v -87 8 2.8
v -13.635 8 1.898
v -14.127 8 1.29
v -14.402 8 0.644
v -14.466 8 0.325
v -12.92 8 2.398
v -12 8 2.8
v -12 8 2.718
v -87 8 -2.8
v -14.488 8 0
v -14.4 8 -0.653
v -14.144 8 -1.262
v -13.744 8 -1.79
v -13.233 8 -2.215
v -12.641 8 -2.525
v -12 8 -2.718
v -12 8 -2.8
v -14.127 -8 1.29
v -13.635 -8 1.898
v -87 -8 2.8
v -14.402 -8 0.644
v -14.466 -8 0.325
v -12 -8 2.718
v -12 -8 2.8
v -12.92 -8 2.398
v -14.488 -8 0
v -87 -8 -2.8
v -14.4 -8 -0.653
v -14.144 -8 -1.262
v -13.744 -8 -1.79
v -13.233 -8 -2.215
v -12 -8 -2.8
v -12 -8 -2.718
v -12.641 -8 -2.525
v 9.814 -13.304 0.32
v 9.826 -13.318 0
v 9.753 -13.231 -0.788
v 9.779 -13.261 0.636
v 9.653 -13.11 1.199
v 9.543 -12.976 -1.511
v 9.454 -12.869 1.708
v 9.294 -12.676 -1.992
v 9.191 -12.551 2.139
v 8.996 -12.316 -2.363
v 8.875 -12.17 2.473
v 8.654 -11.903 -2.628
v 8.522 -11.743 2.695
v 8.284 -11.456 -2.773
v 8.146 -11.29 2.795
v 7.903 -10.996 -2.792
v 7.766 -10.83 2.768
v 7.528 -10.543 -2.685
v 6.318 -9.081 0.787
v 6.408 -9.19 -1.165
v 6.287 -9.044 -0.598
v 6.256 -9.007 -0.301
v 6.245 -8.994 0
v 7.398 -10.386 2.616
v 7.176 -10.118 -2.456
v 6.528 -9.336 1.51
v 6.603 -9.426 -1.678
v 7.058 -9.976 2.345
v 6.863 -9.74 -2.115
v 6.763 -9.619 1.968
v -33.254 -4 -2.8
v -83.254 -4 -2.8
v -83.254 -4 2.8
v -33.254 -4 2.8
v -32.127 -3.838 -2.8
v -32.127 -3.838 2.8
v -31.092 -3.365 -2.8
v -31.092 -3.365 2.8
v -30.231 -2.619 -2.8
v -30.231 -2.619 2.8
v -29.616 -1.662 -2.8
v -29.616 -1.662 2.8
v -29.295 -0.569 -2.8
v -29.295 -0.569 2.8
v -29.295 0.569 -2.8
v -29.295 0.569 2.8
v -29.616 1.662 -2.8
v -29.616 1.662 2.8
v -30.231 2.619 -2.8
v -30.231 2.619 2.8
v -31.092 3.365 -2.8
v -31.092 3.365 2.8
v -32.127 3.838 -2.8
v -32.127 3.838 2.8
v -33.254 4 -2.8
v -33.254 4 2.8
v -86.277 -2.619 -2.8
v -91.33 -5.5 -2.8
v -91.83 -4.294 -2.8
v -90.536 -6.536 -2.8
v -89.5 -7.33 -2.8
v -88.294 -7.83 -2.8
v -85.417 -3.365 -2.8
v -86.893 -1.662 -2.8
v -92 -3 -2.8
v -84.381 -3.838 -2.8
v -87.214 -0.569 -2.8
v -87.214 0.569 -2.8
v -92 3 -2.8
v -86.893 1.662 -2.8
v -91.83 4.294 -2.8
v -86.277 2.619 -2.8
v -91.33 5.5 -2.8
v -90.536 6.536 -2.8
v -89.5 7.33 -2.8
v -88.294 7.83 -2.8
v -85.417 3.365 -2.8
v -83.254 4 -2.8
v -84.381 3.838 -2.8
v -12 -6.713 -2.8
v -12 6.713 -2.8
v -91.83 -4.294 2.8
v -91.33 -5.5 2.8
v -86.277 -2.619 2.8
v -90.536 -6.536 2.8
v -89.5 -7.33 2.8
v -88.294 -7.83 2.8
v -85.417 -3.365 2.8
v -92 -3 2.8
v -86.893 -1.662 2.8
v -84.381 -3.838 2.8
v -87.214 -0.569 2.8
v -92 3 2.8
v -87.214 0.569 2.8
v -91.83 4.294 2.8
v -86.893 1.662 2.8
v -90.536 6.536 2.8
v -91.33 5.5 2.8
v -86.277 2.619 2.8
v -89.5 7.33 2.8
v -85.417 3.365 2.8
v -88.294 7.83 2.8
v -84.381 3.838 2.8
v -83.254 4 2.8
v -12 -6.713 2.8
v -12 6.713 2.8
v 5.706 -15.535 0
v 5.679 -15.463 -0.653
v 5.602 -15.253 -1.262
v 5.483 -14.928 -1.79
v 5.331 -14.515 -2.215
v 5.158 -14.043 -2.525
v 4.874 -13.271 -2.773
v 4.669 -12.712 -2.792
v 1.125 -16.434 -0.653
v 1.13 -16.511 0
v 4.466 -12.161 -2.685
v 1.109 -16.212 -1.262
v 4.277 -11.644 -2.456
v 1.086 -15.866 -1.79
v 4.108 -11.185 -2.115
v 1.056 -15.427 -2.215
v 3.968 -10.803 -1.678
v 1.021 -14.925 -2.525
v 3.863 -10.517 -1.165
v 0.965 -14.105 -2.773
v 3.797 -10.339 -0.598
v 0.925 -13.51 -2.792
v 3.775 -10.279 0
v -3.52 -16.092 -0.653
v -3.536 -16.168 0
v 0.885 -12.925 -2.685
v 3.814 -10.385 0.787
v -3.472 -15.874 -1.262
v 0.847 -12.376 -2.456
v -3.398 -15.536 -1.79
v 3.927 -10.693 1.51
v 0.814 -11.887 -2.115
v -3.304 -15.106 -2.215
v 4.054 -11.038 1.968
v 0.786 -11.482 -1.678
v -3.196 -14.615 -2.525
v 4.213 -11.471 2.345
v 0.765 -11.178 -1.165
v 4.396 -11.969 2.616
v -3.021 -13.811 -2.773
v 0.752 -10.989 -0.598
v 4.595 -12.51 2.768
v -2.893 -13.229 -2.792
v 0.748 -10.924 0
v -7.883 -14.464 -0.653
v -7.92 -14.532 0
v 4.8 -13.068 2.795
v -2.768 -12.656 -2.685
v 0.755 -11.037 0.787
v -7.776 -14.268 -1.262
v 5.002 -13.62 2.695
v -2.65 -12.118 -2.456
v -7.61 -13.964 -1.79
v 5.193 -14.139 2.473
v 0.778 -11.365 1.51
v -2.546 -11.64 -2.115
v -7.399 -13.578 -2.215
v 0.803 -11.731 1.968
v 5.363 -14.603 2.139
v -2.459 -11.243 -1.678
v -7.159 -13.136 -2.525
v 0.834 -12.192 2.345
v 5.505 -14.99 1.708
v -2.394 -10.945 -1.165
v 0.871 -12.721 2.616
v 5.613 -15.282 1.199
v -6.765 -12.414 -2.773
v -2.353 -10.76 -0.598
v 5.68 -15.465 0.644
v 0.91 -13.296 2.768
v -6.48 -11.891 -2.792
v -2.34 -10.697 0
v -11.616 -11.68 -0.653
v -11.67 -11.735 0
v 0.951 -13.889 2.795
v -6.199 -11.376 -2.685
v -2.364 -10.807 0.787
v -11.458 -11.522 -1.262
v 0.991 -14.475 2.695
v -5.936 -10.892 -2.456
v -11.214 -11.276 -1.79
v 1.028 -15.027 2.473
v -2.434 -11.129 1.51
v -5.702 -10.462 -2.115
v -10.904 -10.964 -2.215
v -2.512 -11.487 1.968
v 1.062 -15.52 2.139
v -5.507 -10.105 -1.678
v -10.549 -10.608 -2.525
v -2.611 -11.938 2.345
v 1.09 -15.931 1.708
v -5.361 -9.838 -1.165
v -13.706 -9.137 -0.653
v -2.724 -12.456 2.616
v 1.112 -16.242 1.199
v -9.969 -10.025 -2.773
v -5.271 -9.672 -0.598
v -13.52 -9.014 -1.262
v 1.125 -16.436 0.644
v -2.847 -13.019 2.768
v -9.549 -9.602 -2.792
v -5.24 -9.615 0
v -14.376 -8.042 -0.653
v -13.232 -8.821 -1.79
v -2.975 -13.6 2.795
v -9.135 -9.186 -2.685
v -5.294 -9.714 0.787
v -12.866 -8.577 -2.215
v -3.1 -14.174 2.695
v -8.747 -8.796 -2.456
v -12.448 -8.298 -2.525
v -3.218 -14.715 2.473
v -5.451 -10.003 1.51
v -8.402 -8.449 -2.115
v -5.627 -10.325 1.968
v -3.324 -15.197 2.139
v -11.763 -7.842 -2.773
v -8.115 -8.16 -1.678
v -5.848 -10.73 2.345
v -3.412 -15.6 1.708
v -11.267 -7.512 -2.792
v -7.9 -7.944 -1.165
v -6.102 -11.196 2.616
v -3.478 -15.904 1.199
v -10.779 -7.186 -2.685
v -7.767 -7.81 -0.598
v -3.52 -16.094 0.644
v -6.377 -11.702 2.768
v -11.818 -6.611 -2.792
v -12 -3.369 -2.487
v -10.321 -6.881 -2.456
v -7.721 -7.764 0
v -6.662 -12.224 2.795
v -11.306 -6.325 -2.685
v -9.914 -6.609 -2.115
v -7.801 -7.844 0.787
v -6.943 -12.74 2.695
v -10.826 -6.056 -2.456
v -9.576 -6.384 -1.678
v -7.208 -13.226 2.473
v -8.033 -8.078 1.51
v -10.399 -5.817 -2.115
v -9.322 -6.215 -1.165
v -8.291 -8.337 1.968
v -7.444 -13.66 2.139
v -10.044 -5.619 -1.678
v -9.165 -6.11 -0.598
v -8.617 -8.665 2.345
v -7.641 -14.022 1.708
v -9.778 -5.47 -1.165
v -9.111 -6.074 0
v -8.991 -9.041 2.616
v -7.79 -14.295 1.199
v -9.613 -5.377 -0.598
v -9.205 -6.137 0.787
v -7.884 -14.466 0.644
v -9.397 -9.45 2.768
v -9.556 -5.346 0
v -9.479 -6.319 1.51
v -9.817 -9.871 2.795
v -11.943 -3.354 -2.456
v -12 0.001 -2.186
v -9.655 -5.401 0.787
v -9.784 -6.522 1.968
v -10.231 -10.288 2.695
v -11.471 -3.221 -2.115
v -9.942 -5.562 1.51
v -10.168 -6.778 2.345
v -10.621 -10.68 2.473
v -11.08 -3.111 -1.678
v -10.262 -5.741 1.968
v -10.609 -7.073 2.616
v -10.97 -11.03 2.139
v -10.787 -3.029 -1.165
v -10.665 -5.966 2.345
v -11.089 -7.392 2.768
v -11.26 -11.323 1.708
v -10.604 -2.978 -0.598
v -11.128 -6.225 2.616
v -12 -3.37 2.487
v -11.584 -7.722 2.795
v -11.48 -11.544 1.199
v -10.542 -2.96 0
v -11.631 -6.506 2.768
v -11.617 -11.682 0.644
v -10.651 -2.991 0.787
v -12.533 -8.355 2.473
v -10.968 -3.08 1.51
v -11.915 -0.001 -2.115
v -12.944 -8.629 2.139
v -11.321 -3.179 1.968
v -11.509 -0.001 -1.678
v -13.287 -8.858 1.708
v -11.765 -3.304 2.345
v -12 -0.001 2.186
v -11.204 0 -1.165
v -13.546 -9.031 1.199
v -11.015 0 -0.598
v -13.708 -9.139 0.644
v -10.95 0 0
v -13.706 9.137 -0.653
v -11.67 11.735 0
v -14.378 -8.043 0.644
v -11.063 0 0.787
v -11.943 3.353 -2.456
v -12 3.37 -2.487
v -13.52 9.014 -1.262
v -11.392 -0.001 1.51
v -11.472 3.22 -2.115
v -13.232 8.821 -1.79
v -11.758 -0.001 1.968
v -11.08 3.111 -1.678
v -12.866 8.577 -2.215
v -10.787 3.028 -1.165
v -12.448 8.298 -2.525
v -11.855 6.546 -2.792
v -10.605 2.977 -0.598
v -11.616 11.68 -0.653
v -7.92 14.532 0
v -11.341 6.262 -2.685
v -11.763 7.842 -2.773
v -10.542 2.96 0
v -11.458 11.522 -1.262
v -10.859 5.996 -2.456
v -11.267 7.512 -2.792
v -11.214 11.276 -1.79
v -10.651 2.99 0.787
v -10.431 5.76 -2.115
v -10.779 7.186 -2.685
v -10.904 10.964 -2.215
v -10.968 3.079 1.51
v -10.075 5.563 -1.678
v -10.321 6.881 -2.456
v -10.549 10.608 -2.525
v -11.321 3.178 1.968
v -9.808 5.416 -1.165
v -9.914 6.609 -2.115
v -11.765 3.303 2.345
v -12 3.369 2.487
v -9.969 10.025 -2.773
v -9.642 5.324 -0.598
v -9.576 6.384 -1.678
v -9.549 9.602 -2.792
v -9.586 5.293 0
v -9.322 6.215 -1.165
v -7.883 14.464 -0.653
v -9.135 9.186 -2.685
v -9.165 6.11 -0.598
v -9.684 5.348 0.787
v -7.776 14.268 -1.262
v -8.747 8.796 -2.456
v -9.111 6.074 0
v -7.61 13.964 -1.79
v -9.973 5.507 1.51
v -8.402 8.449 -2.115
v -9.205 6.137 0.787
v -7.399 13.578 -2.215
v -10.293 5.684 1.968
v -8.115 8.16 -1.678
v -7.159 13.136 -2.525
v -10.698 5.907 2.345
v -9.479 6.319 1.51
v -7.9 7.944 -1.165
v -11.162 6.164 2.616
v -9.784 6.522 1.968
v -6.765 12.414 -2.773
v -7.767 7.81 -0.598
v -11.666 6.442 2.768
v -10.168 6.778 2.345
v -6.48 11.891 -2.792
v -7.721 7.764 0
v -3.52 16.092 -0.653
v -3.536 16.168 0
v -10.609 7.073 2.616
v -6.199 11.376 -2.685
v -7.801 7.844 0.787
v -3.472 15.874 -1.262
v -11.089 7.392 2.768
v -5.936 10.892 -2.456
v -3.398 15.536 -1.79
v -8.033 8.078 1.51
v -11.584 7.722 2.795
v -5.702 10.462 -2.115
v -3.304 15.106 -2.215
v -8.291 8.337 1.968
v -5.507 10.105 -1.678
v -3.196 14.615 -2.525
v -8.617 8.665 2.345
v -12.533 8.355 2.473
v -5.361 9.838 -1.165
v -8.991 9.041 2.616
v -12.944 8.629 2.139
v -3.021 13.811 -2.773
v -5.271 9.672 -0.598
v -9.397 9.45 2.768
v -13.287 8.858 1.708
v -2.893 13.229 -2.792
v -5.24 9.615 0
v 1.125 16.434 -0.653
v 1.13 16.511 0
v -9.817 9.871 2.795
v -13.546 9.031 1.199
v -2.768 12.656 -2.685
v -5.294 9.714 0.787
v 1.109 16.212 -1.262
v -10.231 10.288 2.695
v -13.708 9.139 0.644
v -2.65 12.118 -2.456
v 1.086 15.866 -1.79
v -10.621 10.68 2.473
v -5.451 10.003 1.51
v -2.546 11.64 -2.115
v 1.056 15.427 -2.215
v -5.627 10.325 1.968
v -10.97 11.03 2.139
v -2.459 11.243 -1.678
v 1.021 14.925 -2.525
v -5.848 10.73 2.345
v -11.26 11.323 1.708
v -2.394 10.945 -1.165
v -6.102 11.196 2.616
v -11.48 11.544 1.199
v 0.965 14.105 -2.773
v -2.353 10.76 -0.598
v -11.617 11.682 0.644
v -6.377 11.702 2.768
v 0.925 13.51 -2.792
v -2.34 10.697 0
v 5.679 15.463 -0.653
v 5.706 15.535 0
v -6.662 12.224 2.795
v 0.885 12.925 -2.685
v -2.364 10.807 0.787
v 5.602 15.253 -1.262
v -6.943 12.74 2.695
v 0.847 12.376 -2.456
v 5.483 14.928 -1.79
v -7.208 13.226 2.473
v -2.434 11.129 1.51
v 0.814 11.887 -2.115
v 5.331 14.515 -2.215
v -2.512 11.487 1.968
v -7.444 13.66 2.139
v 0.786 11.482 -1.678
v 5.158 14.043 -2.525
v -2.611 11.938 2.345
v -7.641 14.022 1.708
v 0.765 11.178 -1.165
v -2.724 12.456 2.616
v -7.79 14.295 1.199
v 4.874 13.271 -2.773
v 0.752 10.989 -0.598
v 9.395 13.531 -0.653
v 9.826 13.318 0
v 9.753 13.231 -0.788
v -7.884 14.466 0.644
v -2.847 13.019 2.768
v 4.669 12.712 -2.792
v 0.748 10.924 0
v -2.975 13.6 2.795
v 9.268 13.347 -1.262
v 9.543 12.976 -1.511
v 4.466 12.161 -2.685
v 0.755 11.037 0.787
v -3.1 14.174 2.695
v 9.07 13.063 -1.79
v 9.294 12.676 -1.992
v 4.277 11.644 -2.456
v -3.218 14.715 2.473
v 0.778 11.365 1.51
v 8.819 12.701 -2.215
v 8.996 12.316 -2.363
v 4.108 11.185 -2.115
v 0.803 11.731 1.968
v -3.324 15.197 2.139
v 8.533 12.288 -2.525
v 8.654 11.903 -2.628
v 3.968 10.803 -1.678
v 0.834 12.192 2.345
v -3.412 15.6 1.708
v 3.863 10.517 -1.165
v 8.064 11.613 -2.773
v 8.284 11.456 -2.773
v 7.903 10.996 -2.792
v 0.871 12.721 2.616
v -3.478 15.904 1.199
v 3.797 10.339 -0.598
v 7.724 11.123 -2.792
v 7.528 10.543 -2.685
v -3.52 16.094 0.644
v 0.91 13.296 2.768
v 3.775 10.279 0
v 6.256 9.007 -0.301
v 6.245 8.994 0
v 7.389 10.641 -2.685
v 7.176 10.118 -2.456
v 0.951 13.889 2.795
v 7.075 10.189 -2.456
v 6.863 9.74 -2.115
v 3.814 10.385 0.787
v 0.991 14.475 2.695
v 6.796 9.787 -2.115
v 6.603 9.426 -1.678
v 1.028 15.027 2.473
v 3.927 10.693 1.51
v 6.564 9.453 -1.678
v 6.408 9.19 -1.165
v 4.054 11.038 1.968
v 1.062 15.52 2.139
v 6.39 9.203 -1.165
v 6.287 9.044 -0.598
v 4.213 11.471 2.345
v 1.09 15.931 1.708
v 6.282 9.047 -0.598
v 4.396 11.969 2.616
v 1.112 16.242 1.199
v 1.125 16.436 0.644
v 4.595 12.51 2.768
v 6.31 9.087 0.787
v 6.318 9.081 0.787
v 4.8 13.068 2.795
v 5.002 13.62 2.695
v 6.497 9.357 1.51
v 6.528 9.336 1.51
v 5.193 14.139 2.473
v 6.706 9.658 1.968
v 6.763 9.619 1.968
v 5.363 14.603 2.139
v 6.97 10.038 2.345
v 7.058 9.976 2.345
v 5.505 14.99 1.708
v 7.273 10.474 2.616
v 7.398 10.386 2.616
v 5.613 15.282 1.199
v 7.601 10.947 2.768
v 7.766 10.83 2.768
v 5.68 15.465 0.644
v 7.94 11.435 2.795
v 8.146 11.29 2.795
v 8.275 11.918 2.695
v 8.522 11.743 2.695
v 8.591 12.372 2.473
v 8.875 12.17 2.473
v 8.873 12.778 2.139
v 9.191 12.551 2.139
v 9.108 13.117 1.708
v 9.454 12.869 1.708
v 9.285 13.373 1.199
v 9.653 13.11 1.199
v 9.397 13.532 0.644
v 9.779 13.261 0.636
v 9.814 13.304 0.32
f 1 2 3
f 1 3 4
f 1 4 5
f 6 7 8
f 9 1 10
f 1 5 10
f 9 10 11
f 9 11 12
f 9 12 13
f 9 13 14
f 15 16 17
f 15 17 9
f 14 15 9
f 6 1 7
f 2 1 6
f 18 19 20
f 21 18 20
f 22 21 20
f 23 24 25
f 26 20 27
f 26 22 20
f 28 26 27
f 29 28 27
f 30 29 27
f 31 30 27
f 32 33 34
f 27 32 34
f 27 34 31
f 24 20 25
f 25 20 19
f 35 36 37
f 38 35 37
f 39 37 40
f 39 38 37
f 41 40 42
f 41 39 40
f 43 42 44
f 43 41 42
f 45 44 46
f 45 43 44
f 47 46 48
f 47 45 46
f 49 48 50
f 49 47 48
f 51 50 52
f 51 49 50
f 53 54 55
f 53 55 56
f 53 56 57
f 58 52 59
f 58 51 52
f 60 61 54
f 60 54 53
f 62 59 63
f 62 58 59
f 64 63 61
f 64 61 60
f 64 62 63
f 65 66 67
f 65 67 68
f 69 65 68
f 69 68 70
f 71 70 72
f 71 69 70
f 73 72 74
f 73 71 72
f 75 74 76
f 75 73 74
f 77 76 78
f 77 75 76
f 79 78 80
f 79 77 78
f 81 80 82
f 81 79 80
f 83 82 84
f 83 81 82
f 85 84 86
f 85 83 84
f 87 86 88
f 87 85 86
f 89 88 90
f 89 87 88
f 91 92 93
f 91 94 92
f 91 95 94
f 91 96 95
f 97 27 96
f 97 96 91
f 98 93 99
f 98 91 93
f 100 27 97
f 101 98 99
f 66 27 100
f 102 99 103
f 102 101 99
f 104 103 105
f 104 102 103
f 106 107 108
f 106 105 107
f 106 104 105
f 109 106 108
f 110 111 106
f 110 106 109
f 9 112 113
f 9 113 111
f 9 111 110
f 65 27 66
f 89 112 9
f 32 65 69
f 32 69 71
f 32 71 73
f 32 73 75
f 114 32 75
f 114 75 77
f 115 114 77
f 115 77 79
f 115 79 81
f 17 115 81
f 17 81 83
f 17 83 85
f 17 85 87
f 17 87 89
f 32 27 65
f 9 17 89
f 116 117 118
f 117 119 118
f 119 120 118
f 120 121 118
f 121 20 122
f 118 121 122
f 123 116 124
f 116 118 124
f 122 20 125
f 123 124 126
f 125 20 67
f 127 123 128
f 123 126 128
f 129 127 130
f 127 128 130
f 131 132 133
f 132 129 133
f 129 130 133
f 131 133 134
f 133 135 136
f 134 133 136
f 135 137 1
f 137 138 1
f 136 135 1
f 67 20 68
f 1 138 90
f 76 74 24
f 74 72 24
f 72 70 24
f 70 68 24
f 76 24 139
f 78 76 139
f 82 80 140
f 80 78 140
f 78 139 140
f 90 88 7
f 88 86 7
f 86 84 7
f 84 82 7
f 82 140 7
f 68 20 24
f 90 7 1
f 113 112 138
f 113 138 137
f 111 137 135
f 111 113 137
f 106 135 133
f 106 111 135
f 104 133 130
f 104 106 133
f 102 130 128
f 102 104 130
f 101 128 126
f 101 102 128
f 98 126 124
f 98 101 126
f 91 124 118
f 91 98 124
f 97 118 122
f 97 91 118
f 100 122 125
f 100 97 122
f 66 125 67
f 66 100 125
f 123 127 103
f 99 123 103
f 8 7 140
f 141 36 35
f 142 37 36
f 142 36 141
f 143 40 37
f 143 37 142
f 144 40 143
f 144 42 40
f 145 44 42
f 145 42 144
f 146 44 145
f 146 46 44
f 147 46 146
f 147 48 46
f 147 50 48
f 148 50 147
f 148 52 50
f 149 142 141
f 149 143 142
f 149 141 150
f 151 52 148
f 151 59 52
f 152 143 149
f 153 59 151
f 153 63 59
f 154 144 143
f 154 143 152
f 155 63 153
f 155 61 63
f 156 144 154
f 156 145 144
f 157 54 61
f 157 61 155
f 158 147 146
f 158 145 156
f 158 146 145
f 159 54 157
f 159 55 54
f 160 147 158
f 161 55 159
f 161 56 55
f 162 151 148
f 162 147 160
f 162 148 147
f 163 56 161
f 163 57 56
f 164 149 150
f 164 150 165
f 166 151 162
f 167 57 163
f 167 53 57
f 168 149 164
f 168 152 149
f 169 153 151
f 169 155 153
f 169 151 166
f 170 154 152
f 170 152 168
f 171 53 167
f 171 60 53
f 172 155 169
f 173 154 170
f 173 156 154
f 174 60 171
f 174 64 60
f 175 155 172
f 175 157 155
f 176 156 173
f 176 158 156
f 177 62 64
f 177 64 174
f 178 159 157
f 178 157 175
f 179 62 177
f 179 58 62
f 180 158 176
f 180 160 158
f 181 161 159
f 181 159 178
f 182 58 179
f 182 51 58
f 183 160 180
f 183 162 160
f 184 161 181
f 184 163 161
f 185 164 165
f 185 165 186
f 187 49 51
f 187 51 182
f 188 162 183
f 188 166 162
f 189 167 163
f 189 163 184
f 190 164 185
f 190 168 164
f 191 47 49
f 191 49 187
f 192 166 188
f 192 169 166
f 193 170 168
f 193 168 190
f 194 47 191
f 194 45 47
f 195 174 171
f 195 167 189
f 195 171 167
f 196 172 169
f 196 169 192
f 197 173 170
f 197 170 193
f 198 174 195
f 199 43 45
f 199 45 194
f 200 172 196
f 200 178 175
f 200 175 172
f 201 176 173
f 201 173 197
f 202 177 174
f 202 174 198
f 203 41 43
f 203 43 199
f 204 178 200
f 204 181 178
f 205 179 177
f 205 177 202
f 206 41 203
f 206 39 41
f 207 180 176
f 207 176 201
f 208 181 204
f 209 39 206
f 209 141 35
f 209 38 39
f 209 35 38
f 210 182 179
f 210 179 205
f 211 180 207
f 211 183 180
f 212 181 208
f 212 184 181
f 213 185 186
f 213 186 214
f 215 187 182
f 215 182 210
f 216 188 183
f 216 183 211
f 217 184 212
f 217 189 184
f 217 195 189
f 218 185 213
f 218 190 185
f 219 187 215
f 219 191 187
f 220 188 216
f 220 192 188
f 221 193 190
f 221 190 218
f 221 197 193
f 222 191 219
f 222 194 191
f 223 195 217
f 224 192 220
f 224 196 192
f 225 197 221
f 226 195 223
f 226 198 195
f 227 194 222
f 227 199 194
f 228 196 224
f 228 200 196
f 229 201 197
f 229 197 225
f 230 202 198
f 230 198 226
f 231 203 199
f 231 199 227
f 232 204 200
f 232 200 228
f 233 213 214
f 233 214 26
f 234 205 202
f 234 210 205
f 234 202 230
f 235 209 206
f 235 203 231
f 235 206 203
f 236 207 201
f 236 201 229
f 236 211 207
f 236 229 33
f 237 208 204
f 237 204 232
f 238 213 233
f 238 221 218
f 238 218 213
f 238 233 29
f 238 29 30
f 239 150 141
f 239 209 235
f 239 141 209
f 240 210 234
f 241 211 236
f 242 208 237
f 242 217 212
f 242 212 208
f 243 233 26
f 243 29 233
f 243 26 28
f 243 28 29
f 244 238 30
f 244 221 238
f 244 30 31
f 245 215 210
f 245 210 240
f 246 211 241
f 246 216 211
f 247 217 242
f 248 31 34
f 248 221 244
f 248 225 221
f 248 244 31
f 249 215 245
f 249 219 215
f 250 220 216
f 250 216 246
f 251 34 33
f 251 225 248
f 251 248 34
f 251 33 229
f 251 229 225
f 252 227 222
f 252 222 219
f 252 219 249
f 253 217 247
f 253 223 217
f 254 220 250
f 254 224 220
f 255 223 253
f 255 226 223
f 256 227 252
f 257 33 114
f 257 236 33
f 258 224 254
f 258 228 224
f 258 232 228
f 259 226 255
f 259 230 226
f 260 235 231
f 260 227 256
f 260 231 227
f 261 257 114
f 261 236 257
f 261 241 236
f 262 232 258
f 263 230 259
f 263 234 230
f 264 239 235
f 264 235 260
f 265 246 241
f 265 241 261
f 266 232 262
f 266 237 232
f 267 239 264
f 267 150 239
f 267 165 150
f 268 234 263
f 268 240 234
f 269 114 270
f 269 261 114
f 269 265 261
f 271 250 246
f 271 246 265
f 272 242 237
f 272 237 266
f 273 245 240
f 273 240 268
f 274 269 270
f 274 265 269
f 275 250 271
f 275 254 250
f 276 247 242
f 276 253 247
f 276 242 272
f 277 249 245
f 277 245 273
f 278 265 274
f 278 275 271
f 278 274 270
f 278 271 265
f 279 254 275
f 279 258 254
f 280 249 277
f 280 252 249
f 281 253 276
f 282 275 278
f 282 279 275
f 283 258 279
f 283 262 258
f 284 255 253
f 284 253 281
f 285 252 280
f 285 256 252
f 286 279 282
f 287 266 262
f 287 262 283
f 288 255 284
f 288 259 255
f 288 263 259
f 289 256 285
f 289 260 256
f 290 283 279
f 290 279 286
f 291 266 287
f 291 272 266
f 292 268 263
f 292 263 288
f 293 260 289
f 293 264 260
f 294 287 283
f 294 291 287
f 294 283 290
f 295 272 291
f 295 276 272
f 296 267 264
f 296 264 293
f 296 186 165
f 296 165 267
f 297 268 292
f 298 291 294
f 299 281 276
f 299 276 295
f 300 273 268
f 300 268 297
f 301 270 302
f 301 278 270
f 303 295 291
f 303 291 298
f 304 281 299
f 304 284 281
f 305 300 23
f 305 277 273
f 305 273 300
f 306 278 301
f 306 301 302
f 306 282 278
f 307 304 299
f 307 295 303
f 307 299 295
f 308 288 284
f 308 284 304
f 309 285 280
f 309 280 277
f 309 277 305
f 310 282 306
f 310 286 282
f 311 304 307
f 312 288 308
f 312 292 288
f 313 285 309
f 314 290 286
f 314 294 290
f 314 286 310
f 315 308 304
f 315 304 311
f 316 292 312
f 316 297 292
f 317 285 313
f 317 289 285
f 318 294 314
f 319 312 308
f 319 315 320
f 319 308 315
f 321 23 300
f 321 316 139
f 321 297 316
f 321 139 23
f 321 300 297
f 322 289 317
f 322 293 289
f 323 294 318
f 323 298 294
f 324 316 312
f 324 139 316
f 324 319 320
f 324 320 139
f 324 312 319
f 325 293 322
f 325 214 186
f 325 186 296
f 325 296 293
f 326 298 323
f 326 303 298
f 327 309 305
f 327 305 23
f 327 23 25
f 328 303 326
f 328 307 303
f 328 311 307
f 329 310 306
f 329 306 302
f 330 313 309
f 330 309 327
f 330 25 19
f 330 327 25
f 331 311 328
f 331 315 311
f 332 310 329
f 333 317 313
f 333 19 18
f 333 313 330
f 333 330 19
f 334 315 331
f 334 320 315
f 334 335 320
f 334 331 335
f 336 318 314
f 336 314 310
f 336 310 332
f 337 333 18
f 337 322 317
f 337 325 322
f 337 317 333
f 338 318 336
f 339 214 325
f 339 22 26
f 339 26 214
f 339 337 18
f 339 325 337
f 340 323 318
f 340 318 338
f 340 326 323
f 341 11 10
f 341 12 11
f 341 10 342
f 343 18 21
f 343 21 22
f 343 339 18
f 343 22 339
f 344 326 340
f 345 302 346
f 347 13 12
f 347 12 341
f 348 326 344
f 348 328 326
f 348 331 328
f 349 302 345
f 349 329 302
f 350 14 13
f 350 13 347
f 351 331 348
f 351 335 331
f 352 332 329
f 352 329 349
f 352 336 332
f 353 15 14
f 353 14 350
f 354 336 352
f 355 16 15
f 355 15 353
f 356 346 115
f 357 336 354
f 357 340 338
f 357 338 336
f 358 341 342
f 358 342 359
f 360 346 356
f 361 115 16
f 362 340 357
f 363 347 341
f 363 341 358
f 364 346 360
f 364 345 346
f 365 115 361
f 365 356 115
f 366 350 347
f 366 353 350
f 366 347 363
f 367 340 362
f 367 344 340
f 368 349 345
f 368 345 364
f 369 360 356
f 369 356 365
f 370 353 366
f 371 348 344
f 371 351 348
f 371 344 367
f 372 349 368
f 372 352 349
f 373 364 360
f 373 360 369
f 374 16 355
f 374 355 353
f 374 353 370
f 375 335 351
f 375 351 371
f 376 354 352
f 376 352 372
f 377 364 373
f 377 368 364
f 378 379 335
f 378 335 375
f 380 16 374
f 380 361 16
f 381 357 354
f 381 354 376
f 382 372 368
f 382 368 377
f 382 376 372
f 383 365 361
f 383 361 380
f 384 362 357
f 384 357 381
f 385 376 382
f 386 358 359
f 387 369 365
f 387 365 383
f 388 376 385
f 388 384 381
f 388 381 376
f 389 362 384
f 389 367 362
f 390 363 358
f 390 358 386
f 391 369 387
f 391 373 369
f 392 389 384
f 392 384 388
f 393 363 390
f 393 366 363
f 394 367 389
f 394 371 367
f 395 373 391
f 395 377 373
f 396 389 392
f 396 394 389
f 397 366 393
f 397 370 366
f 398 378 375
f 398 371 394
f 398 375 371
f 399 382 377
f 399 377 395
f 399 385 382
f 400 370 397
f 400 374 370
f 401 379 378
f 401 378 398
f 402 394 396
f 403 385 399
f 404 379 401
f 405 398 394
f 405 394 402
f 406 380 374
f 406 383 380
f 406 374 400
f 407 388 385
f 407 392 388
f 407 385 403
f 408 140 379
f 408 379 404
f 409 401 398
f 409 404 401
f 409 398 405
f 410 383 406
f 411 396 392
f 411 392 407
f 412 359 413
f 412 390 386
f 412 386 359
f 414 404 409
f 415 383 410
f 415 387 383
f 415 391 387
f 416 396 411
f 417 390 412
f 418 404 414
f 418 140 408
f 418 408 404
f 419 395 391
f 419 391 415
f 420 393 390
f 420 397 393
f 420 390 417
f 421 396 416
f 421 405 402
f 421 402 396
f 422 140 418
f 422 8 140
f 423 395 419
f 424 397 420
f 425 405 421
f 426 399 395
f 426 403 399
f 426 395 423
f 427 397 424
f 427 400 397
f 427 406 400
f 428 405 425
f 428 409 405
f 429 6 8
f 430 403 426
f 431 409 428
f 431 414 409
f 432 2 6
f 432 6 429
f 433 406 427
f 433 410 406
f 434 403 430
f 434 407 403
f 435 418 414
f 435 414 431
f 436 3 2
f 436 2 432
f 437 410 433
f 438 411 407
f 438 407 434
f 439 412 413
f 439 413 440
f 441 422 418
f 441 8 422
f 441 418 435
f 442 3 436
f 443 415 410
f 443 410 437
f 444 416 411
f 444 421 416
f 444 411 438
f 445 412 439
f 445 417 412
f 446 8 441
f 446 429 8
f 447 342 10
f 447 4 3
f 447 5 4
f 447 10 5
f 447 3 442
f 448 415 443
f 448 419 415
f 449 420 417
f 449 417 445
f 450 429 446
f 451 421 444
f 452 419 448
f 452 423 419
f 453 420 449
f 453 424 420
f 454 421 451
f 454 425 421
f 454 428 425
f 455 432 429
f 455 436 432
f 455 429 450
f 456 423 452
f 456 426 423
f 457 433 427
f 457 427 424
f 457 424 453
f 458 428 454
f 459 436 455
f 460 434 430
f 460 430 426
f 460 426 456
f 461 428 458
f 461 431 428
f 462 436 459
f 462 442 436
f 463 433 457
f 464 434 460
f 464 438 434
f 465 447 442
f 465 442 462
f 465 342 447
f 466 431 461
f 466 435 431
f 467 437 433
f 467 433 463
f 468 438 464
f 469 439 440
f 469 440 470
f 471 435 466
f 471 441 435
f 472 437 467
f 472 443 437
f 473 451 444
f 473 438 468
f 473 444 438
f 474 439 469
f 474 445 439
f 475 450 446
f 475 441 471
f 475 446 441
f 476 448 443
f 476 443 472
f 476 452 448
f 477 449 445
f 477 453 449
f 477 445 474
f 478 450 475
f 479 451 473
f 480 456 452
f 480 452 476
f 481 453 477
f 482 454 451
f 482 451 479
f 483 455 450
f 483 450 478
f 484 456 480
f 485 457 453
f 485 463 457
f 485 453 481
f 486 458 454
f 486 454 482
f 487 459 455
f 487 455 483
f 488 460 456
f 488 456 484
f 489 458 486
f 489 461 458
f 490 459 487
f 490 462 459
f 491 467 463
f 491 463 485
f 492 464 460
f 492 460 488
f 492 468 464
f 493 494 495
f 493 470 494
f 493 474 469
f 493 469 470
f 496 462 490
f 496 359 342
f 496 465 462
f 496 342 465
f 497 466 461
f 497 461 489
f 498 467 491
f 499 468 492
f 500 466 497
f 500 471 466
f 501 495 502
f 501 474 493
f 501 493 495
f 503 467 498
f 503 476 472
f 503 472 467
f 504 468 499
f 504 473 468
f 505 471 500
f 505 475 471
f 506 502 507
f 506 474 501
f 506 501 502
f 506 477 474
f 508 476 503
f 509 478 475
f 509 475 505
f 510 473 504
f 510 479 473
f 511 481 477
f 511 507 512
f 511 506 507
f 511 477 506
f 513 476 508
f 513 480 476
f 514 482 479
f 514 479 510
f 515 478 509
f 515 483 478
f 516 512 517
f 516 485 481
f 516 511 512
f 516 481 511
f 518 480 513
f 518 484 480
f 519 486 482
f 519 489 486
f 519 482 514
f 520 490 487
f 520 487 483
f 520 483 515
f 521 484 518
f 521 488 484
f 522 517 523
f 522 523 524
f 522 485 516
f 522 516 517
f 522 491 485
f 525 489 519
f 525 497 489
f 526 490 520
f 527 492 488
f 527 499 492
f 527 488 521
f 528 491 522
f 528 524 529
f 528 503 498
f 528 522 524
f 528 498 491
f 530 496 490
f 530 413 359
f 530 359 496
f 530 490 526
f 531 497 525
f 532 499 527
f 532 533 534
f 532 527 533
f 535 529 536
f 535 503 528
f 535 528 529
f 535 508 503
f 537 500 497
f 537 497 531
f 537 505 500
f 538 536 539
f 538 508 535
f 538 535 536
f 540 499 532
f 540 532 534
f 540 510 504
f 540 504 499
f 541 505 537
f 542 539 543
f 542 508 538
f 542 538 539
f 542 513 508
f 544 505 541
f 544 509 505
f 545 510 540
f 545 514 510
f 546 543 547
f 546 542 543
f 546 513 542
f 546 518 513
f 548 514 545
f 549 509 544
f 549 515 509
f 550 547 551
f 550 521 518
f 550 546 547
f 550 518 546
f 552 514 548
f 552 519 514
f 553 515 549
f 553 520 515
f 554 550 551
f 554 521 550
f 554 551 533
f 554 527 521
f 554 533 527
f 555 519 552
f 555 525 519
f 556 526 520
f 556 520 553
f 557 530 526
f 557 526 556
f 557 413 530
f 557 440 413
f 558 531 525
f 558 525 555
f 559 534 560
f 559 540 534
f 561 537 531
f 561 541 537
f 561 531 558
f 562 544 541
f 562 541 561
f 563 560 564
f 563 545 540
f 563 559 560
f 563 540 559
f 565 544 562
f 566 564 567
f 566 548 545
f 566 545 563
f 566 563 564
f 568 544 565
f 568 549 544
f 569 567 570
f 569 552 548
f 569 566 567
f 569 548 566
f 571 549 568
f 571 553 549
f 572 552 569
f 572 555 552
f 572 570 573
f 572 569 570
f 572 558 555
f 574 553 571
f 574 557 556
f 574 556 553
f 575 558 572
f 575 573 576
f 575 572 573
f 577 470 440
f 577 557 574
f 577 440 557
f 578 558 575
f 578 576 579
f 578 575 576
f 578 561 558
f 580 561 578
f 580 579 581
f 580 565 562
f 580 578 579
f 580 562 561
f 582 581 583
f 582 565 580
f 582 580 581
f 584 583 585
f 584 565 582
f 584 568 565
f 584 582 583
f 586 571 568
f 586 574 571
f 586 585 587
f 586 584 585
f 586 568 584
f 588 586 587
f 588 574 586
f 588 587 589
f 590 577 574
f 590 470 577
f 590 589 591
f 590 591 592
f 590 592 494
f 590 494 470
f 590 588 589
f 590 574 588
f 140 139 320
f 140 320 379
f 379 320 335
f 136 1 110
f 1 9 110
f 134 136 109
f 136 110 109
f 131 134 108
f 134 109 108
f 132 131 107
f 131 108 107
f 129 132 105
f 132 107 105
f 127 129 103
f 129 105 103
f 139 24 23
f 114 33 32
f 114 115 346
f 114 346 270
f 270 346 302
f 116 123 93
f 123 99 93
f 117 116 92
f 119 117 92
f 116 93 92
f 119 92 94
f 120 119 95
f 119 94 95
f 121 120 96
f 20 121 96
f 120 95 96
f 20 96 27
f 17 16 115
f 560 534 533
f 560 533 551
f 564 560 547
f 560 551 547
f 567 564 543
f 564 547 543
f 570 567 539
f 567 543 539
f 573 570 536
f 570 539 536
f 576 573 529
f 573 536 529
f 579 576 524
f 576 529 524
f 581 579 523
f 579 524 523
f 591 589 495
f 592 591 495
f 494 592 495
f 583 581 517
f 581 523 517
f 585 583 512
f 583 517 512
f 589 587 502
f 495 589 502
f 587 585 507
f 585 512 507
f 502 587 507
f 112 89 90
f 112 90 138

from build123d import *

# Parameters (mm, degrees)
ESBO_O2_R                  = 2.8
CORTE_EXTRUS_O1_DEPTH      = 10
CORTE_EXTRUS_O1_DEPTH_BACK = 10
RESSALTO_EXTRUS_O1_START   = -12
ESBO_O5_W                  = 5.6
ESBO_O5_H                  = 16
RESSALTO_EXTRUS_O1_DEPTH   = 80
FILETE1_R                  = 5
CORTE_EXTRUS_O2_DEPTH      = 19


with BuildPart() as part:
    # Esboço2 → Revolução1 (revolve)
    with BuildSketch(Plane(origin=(0, 0, 0), x_dir=(1, 0, 0), z_dir=(0, 1, 0))):
        with Locations((13.75, 0)):
            Circle(ESBO_O2_R)
    revolve(axis=Axis((0, 0, 0), (0, 0, -1)))

    # Esboço3 → Corte-extrusão1 (cut, two sides: drawn at the far end of the back side and taken through both)
    with BuildSketch(Plane.XY.offset(-CORTE_EXTRUS_O1_DEPTH_BACK)):
        Polygon((-1.202746457, 0), (18.876681975, 24.24777346), (18.876681975, -24.24777346), align=None)
    extrude(amount=CORTE_EXTRUS_O1_DEPTH + CORTE_EXTRUS_O1_DEPTH_BACK, mode=Mode.SUBTRACT)

    # Esboço5 → Ressalto-extrusão1 (add)
    with BuildSketch(Plane(origin=(0, 0, 0), x_dir=(0, 0, -1), z_dir=(1, 0, 0)).offset(RESSALTO_EXTRUS_O1_START)):
        Rectangle(ESBO_O5_W, ESBO_O5_H)
    extrude(amount=-RESSALTO_EXTRUS_O1_DEPTH)

    # Filete1
    filete1_edges = [part.edges().sort_by_distance(p)[0] for p in [
        (-92, 8, 0),
        (-92, -8, 0),
    ]]
    fillet(filete1_edges, radius=FILETE1_R)

    # Esboço7 → Corte-extrusão2 (cut)
    with BuildSketch(Plane(origin=(0, 0, -2.8), x_dir=(-1, 0, 0), z_dir=(0, 0, -1))):
        with BuildLine():
            Line((33.254278711, 4), (83.254278711, 4))
            ThreePointArc((83.254278711, 4), (87.254278711, 0), (83.254278711, -4))
            Line((83.254278711, -4), (33.254278711, -4))
            ThreePointArc((33.254278711, -4), (29.254278711, 0), (33.254278711, 4))
        make_face()
    extrude(amount=-CORTE_EXTRUS_O2_DEPTH, mode=Mode.SUBTRACT)


solid = part.part
